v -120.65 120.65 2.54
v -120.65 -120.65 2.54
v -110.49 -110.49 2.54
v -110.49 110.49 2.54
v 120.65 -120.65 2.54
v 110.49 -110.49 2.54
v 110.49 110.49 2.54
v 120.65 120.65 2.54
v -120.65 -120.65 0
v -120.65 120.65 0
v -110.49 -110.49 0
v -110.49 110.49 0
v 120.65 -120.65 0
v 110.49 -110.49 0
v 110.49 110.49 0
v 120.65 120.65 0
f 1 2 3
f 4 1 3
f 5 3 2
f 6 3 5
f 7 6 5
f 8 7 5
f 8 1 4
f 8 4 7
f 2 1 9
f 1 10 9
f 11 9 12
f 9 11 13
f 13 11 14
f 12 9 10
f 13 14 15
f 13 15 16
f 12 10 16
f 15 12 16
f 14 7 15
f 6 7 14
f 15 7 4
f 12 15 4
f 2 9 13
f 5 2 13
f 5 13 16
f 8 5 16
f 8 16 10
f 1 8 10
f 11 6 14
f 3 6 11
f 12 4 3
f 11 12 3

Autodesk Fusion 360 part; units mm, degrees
sketch "Sketch1" plane through (0, 0, 0) normal (0, 0, 1) x (1, 0, 0)
  line L0 (120.65, 120.65) -> (-120.65, 120.65)
  line L1 (-120.65, 120.65) -> (-120.65, -120.65)
  line L2 (-120.65, -120.65) -> (120.65, -120.65)
  line L3 (120.65, -120.65) -> (120.65, 120.65)
  line L4 (120.65, 120.65) -> (-120.65, -120.65) construction
  line L5 (-120.65, 120.65) -> (120.65, -120.65) construction
  dimension "d10" = 241.3
  dimension "d11" = 241.3
extrude "Extrude1" add sketch "Sketch1" along normal blind 2.54
sketch "Sketch2" plane through (0, 0, 2.54) normal (0, 0, 1) x (1, 0, 0)
  line L0 (120.65, -120.65) -> (120.65, 120.65)
  line L1 (120.65, 120.65) -> (-120.65, 120.65)
  line L2 (-120.65, 120.65) -> (-120.65, -120.65)
  line L3 (-120.65, -120.65) -> (120.65, -120.65)
  line L4 (110.49, 110.49) -> (-110.49, 110.49)
  line L5 (-110.49, 110.49) -> (-110.49, -110.49)
  line L6 (-110.49, -110.49) -> (110.49, -110.49)
  line L7 (110.49, -110.49) -> (110.49, 110.49)
  line L8 (110.49, 110.49) -> (-110.49, -110.49) construction
  line L9 (-110.49, 110.49) -> (110.49, -110.49) construction
  dimension "d14" = 220.98
  dimension "d15" = 220.98
sketch "Sketch3" plane through (0, 0, 2.54) normal (0, 0, 1) x (1, 0, 0)
  line L0 (110.49, 110.49) -> (-110.49, 110.49)
  line L1 (110.49, -110.49) -> (110.49, 110.49)
  line L2 (-110.49, -110.49) -> (110.49, -110.49)
  line L3 (-110.49, 110.49) -> (-110.49, -110.49)
  line L4 (-110.49, 110.49) -> (-85.09, 110.49)
  line L5 (-85.09, 110.49) -> (-85.09, 85.09)
  line L6 (-85.09, 85.09) -> (-110.49, 85.09)
  line L7 (-110.49, 85.09) -> (-110.49, 110.49)
  dimension "d16" = 25.4
  dimension "d17" = 25.4
sketch "Sketch4" plane through (0, 0, 2.54) normal (0, 0, 1) x (1, 0, 0)
  line L0 (110.49, 110.49) -> (-110.49, 110.49)
  line L1 (110.49, -110.49) -> (110.49, 110.49)
  line L2 (-110.49, -110.49) -> (110.49, -110.49)
  line L3 (-110.49, 110.49) -> (-110.49, -110.49)
  line L4 (-110.49, 110.49) -> (-85.09, 110.49)
  line L5 (-85.09, 110.49) -> (-85.09, 85.09)
  line L6 (-85.09, 85.09) -> (-110.49, 85.09)
  line L7 (-110.49, 85.09) -> (-110.49, 110.49)
  dimension "d20" = 25.4
  dimension "d21" = 25.4
extrude "Grid First Cut" cut sketch "Sketch4" against normal blind 5.08 contours L0 L3 L4 L5 L6 L7
pattern_linear "R-Pattern1" count 8 spacing 27.94 along (1, 0, 0) count 8 spacing 27.94 along (0, -1, 0) of "Grid First Cut"
extrude "Extrude2" cut sketch "Sketch3" against normal blind 5.08
equation "surfaceWidth = 9.5 in"
equation "surfaceDepth = 9.5 in"
equation "surfaceThickness = 0.1 in"
equation "borderWidth = 0.4 in"
equation "gridOpeningX = 1 in"
equation "gridOpeningY = 1 in"
equation "gridWebWidth = 0.1 in"
equation "payloadWidth = surfaceWidth - ( 2 * borderWidth )"
equation "payloadDepth = surfaceDepth - ( 2 * borderWidth )"
equation "d10 = surfaceWidth"
equation "d11 = surfaceDepth"
equation "d12 = surfaceThickness"
equation "d14 = payloadWidth"
equation "d15 = payloadDepth"
equation "d16 = gridOpeningX"
equation "d17 = gridOpeningY"
equation "d20 = gridOpeningY"
equation "d21 = gridOpeningX"
equation "gridPitchX = gridOpeningX + gridWebWidth"
equation "d29 = gridPitchX"
equation "d30 = gridPitchX"
